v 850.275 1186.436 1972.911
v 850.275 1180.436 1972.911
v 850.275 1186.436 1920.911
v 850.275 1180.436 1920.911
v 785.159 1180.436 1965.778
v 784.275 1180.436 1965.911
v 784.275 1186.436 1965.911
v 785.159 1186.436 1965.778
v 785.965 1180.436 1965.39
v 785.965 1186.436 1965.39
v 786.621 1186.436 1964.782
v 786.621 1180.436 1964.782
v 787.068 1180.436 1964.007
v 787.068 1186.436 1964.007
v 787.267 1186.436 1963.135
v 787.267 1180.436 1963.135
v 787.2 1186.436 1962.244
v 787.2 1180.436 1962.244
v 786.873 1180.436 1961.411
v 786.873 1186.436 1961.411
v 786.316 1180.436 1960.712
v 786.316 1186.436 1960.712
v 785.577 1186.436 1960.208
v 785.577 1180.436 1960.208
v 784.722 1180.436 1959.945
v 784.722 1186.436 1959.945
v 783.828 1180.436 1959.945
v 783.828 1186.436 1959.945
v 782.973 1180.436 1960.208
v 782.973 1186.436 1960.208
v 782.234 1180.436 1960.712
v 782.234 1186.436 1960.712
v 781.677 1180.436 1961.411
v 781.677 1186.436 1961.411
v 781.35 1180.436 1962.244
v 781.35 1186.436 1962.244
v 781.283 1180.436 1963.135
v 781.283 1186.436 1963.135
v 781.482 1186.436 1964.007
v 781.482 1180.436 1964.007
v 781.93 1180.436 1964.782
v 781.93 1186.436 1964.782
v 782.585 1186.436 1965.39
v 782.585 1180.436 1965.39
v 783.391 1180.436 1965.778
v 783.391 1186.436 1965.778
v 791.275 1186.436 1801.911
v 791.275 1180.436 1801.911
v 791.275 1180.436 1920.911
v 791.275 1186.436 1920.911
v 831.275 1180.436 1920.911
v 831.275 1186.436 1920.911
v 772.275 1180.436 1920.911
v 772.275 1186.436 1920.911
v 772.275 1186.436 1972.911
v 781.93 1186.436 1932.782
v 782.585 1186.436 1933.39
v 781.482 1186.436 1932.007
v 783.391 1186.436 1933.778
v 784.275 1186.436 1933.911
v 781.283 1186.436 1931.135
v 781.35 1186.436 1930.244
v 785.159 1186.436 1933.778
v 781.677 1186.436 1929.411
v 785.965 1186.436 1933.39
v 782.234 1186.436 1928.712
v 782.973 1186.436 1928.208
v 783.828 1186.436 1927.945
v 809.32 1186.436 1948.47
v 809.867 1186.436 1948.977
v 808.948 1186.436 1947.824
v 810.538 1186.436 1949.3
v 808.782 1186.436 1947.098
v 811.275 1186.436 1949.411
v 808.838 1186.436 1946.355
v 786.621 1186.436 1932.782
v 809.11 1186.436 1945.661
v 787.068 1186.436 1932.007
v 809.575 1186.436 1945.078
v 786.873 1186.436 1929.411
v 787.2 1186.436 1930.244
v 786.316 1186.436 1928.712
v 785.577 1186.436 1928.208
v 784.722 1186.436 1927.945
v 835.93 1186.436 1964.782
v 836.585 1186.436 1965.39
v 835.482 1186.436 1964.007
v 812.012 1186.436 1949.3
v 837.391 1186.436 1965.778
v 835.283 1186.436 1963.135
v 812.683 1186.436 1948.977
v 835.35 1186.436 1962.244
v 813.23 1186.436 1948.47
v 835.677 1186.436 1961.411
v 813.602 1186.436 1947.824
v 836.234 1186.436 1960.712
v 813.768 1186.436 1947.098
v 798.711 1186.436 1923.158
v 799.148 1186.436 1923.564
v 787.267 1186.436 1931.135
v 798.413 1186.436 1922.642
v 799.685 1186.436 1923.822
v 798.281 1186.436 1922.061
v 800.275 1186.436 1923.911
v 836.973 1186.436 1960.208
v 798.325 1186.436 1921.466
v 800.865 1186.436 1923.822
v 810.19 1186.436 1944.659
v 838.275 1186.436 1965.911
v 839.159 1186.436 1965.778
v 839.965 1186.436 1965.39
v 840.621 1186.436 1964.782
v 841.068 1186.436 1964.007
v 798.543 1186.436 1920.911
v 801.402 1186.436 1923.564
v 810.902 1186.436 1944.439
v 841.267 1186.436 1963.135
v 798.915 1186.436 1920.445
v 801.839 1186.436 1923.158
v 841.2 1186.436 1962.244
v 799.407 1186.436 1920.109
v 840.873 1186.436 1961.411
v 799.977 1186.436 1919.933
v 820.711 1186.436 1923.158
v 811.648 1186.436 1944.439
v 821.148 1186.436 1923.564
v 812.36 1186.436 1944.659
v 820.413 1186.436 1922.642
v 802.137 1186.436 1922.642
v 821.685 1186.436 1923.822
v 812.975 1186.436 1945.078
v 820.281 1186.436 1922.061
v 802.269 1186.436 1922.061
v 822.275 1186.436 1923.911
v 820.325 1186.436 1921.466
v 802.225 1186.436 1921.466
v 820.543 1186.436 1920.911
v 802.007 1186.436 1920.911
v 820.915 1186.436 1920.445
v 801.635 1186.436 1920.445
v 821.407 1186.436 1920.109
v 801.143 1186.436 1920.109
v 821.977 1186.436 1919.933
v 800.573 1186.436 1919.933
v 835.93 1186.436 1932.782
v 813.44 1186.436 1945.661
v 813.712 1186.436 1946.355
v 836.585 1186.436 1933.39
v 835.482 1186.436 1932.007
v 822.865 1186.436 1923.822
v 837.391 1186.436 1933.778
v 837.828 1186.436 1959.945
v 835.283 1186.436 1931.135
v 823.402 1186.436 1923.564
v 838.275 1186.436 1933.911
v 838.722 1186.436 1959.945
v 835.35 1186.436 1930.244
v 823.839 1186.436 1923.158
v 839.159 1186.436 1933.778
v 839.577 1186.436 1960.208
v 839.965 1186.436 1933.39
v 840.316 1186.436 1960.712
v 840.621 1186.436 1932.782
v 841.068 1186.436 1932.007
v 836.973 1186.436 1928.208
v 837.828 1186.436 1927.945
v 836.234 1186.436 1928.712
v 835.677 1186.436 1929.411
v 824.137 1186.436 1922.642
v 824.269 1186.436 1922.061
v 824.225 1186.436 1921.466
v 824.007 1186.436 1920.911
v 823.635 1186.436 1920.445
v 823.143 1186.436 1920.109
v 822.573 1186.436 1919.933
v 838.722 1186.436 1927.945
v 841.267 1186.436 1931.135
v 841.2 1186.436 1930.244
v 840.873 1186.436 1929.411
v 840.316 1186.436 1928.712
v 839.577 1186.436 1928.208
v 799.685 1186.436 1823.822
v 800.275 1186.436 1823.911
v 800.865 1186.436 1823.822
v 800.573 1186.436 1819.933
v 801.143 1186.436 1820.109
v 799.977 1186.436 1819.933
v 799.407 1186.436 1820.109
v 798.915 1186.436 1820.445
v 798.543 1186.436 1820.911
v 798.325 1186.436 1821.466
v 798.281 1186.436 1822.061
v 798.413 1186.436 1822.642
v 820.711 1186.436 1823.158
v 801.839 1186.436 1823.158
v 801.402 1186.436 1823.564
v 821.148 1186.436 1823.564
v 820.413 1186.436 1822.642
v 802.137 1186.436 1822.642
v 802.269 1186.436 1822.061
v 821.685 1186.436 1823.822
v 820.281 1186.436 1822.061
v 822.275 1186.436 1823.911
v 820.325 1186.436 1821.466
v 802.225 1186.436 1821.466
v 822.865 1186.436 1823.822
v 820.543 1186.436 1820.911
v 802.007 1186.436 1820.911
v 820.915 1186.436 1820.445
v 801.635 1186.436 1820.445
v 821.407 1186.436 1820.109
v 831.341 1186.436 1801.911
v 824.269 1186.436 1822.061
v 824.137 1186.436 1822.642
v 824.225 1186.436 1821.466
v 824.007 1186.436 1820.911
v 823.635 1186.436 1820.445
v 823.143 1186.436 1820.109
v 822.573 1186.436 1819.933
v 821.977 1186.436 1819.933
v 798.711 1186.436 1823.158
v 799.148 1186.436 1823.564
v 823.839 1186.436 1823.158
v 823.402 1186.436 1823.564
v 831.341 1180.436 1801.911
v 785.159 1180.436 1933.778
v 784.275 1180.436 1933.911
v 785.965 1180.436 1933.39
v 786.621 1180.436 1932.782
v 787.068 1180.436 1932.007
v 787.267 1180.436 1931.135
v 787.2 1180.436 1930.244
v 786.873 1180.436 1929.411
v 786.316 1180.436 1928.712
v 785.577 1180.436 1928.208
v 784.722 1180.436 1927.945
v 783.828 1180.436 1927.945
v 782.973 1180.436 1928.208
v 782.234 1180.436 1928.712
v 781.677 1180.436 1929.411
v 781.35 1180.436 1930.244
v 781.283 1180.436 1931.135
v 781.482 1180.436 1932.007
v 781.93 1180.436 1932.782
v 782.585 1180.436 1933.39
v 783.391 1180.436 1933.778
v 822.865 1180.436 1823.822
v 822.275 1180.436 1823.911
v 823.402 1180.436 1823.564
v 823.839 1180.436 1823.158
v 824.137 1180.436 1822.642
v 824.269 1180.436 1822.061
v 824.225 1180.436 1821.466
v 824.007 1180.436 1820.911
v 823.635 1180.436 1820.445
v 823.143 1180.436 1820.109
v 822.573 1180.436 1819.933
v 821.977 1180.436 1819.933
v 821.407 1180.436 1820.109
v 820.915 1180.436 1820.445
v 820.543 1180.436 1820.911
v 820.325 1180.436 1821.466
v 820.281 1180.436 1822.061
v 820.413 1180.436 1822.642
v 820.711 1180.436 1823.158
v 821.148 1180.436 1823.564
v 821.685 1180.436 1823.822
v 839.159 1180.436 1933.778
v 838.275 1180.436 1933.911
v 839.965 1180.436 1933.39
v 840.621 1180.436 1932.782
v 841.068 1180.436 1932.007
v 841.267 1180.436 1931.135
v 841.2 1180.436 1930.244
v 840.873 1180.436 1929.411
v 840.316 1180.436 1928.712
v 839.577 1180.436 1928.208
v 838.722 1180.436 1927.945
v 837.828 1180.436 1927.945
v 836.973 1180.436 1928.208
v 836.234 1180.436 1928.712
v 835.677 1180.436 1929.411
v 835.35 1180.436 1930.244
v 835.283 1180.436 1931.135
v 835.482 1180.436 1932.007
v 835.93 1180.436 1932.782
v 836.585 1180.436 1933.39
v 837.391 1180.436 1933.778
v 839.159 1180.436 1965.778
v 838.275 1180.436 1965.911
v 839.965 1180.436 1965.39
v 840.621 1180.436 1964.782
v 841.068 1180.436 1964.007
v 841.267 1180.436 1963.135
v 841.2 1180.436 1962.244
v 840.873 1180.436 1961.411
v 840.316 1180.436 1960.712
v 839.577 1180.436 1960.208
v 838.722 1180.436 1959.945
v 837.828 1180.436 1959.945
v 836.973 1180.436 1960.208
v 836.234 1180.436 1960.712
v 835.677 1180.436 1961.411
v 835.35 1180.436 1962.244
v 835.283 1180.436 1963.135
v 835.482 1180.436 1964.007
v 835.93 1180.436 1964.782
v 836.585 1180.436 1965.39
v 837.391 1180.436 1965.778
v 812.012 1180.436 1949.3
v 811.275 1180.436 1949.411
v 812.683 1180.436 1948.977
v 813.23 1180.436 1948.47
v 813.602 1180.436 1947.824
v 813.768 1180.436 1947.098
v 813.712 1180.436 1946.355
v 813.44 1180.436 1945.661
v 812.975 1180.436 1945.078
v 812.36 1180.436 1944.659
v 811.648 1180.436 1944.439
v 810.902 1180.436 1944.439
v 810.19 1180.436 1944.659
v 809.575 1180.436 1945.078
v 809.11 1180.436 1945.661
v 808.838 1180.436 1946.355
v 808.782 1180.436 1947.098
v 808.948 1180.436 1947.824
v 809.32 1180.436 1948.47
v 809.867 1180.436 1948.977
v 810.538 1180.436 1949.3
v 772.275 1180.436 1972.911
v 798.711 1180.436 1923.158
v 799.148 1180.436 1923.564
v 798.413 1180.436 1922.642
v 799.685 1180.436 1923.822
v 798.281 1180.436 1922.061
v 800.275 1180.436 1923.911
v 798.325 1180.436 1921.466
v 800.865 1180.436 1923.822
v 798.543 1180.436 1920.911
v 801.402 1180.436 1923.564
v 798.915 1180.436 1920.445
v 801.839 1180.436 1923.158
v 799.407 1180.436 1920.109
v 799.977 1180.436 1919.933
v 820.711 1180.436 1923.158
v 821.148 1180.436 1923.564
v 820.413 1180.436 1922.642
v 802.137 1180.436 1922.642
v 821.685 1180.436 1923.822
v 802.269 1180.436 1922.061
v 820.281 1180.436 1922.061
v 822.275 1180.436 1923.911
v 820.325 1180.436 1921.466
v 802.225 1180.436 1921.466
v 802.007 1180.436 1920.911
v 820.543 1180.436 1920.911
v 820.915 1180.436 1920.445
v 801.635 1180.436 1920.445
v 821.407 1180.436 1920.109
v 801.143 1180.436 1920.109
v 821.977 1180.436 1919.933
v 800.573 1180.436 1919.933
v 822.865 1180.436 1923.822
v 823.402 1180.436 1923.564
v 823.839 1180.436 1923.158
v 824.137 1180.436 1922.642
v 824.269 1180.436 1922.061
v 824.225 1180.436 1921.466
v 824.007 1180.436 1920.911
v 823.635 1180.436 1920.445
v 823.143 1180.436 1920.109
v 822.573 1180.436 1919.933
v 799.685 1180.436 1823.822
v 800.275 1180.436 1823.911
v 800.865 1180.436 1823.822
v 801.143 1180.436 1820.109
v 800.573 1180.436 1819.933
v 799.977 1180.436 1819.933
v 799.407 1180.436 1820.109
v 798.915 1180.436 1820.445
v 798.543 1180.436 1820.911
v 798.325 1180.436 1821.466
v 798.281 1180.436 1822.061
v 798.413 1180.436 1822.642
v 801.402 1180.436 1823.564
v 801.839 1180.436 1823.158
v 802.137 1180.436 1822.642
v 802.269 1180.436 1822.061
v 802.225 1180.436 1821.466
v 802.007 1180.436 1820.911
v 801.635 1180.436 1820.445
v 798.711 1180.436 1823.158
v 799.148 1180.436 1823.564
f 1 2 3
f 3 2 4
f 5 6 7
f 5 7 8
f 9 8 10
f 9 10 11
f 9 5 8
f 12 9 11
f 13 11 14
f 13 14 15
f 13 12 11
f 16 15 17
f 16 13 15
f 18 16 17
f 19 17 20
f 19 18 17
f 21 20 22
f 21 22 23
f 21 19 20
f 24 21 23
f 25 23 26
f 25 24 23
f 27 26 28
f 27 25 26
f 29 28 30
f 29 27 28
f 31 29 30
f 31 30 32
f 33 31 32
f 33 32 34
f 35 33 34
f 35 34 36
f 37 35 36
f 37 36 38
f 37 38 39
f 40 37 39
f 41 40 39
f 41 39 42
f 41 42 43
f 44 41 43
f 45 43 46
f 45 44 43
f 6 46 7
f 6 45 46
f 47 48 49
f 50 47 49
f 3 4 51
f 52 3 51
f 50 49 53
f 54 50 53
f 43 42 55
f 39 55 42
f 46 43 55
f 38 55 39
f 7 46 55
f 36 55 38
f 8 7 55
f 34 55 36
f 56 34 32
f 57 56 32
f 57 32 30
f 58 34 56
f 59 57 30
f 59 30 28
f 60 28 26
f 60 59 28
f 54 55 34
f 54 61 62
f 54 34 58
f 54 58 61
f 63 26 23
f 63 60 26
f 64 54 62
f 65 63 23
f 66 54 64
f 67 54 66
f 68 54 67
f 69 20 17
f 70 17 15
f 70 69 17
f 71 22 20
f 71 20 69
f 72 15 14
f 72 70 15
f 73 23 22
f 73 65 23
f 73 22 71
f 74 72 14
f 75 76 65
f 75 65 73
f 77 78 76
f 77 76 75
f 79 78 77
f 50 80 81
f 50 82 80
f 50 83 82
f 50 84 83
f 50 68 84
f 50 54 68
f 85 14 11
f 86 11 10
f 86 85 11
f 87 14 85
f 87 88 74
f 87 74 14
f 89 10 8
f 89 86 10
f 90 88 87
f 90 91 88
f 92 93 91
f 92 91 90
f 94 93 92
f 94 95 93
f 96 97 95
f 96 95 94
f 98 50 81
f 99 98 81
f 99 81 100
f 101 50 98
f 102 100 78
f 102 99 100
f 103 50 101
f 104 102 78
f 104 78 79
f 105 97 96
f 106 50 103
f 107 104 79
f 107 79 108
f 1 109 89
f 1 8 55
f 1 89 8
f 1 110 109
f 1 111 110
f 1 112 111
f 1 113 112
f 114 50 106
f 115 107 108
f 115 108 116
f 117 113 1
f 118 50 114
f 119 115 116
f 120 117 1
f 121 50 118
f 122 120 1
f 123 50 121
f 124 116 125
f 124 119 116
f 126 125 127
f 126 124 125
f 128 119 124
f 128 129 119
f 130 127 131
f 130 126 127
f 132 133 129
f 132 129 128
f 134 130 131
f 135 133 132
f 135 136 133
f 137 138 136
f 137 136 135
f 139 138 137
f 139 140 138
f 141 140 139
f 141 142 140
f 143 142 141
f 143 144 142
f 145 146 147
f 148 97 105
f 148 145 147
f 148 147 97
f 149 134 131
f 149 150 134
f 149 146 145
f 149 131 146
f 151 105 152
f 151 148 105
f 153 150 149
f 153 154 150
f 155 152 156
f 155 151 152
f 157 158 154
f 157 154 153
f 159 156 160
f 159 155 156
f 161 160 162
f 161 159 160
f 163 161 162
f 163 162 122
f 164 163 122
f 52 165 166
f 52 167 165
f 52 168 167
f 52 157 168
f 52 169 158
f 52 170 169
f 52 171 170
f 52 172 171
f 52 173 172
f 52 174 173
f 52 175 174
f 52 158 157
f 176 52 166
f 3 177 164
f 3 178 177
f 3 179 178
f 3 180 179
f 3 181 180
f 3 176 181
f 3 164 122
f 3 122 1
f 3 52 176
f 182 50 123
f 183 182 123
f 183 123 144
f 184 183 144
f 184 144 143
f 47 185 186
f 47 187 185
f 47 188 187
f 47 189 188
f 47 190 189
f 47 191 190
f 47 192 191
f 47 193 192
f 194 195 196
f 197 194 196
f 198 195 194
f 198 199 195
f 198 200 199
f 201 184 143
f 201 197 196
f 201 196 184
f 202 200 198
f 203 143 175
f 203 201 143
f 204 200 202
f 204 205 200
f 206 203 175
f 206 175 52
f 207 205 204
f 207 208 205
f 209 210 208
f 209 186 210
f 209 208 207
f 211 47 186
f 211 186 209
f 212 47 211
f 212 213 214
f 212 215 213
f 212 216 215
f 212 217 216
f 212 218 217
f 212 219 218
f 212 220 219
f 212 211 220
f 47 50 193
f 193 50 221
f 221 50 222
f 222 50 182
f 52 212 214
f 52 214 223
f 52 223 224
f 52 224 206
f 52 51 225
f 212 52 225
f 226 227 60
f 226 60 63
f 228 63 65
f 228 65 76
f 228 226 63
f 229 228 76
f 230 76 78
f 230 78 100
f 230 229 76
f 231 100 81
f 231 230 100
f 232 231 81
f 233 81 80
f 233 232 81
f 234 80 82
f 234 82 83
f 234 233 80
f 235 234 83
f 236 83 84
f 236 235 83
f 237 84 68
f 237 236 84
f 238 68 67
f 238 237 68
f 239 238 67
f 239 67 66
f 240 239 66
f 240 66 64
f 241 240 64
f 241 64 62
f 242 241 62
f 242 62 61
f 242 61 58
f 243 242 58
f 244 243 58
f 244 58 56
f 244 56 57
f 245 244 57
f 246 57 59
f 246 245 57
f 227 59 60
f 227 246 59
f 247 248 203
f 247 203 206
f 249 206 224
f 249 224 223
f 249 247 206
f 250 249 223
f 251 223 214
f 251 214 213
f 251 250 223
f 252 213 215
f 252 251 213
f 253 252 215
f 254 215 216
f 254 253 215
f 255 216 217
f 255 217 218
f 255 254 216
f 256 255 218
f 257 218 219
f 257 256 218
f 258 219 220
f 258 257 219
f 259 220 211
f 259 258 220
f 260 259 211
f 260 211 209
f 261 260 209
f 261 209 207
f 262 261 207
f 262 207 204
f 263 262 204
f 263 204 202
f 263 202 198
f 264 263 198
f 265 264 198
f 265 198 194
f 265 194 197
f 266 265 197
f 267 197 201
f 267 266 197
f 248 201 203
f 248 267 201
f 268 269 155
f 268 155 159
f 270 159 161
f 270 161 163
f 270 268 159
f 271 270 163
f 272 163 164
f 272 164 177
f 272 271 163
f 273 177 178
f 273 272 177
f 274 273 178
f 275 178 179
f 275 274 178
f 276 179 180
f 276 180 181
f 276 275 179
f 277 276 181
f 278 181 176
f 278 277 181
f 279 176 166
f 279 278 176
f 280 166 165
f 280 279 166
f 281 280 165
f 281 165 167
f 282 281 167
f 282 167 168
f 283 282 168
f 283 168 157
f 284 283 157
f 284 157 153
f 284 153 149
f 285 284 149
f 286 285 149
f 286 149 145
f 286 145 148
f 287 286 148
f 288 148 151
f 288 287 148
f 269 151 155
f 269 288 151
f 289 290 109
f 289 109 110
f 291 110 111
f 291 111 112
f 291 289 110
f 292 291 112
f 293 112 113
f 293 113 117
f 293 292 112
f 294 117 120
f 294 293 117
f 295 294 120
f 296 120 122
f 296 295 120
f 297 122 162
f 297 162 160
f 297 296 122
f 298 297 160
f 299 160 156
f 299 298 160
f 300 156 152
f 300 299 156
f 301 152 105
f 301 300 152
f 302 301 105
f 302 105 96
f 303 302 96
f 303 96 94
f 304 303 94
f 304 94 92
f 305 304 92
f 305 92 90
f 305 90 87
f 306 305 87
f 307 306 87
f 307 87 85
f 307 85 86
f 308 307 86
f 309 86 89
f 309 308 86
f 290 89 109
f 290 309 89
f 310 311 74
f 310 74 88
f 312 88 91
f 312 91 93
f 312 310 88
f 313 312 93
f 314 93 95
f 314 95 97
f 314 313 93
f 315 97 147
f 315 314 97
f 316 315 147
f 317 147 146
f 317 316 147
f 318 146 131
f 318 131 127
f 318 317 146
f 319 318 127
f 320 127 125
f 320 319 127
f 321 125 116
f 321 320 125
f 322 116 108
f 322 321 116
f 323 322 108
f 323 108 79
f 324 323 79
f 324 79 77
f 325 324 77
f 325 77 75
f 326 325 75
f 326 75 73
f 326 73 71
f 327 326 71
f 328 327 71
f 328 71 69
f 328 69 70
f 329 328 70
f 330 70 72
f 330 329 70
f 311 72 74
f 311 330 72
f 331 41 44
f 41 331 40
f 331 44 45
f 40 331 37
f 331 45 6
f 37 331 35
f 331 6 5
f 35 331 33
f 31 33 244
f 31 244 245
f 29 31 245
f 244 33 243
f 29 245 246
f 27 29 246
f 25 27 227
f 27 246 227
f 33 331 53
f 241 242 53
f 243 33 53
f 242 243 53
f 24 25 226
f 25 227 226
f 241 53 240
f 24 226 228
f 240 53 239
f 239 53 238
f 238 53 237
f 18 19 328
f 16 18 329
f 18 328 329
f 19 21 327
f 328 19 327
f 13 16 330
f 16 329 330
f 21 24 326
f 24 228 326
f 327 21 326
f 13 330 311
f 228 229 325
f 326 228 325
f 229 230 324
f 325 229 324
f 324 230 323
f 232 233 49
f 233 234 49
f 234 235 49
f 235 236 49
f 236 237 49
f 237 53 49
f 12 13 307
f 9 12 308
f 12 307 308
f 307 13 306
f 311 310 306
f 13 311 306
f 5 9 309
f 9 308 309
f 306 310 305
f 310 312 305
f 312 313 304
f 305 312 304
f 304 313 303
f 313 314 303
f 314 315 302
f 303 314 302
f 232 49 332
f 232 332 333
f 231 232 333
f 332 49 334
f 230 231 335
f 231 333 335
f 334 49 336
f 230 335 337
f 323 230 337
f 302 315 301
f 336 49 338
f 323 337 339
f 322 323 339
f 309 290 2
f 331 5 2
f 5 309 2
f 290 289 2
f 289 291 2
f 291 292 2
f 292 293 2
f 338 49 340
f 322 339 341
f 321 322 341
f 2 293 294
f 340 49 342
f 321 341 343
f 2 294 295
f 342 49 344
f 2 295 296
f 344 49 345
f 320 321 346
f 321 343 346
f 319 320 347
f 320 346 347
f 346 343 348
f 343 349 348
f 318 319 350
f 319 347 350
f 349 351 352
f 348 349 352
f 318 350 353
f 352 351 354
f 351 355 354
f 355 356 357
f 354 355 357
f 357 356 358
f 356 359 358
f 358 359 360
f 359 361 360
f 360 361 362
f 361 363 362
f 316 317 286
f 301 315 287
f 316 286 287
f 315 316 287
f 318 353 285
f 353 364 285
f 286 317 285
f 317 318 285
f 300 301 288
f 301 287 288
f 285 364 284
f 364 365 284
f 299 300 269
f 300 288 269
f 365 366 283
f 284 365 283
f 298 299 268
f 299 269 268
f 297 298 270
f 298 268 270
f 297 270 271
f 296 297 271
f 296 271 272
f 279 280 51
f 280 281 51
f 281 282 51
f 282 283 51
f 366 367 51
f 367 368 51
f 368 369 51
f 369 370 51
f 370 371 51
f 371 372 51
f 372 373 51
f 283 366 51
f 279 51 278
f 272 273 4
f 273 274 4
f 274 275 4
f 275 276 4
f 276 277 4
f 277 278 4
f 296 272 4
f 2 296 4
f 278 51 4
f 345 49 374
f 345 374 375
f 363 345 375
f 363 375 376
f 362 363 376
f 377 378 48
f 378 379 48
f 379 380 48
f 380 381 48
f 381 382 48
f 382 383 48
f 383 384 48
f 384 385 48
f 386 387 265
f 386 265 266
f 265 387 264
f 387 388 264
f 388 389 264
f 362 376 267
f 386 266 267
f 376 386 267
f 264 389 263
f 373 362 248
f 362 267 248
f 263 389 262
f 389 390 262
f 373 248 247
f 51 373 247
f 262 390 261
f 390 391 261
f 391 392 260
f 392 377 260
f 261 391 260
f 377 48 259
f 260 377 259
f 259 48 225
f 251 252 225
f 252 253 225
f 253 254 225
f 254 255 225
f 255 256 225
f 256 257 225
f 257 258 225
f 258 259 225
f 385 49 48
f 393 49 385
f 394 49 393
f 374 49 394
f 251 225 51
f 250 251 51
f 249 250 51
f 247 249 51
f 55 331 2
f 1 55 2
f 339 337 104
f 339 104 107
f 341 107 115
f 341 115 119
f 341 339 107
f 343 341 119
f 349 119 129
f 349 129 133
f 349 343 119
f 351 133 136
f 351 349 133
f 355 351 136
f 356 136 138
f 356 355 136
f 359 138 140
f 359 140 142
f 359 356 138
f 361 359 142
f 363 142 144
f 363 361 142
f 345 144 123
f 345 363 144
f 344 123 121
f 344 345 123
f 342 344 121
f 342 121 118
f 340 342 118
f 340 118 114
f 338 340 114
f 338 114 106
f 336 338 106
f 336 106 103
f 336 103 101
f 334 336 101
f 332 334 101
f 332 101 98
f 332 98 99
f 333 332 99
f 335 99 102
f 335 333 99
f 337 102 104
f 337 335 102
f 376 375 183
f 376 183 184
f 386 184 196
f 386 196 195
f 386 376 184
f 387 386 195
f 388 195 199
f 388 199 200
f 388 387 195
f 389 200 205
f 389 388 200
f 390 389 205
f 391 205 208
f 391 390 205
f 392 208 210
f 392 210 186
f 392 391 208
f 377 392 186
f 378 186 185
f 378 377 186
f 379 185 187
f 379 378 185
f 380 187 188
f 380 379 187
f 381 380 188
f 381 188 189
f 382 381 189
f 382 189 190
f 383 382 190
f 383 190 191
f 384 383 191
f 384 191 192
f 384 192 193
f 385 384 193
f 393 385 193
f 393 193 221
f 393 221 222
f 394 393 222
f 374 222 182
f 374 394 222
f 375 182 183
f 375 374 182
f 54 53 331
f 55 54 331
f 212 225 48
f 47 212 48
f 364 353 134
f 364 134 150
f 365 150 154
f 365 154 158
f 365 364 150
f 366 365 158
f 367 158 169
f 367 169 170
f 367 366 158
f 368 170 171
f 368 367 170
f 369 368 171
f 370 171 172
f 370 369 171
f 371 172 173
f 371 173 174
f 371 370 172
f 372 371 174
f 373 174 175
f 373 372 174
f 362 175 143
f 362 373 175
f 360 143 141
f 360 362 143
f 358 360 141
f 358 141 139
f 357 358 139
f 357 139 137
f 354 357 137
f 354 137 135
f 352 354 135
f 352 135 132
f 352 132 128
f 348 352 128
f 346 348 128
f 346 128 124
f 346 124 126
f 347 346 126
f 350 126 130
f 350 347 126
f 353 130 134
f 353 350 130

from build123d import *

# Parameters (mm, degrees)
SKETCH2_R           = 2.5
SKETCH2_R_2         = 3
SKETCH2_R_3         = 2
BOSS_EXTRUDE1_DEPTH = 6


with BuildPart() as part:
    # Sketch2 → Boss-Extrude1 (new body)
    with BuildSketch(Plane(origin=(0, 1180.436182905, 0), x_dir=(1, 0, 0), z_dir=(0, 1, 0))):
        Polygon((791.275007127, -1801.911067916), (791.275007127, -1920.911067916), (772.275007127, -1920.911067916), (772.275007127, -1972.911067916), (850.275007127, -1972.911067916), (850.275007127, -1920.911041247), (831.275007127, -1920.911049835), (831.340606325, -1801.911067916), align=None)
        with Locations(Location((811.275007127, -1946.911067916, 0), (0, 0, 270))):
            Circle(SKETCH2_R, mode=Mode.SUBTRACT)
        with Locations(Location((784.275007127, -1930.911067916, 0), (0, 0, 270))):
            Circle(SKETCH2_R_2, mode=Mode.SUBTRACT)
        with Locations(Location((784.275007127, -1962.911067916, 0), (0, 0, 270))):
            Circle(SKETCH2_R_2, mode=Mode.SUBTRACT)
        with Locations(Location((838.275007127, -1930.911067916, 0), (0, 0, 270))):
            Circle(SKETCH2_R_2, mode=Mode.SUBTRACT)
        with Locations(Location((838.275007127, -1962.911067916, 0), (0, 0, 270))):
            Circle(SKETCH2_R_2, mode=Mode.SUBTRACT)
        with Locations(Location((800.275007127, -1921.911067916, 0), (0, 0, 270))):
            Circle(SKETCH2_R_3, mode=Mode.SUBTRACT)
        with Locations(Location((800.275007127, -1821.911067916, 0), (0, 0, 270))):
            Circle(SKETCH2_R_3, mode=Mode.SUBTRACT)
        with Locations(Location((822.275007127, -1921.911067916, 0), (0, 0, 270))):
            Circle(SKETCH2_R_3, mode=Mode.SUBTRACT)
        with Locations(Location((822.275007127, -1821.911067916, 0), (0, 0, 270))):
            Circle(SKETCH2_R_3, mode=Mode.SUBTRACT)
    extrude(amount=BOSS_EXTRUDE1_DEPTH)


solid = part.part
